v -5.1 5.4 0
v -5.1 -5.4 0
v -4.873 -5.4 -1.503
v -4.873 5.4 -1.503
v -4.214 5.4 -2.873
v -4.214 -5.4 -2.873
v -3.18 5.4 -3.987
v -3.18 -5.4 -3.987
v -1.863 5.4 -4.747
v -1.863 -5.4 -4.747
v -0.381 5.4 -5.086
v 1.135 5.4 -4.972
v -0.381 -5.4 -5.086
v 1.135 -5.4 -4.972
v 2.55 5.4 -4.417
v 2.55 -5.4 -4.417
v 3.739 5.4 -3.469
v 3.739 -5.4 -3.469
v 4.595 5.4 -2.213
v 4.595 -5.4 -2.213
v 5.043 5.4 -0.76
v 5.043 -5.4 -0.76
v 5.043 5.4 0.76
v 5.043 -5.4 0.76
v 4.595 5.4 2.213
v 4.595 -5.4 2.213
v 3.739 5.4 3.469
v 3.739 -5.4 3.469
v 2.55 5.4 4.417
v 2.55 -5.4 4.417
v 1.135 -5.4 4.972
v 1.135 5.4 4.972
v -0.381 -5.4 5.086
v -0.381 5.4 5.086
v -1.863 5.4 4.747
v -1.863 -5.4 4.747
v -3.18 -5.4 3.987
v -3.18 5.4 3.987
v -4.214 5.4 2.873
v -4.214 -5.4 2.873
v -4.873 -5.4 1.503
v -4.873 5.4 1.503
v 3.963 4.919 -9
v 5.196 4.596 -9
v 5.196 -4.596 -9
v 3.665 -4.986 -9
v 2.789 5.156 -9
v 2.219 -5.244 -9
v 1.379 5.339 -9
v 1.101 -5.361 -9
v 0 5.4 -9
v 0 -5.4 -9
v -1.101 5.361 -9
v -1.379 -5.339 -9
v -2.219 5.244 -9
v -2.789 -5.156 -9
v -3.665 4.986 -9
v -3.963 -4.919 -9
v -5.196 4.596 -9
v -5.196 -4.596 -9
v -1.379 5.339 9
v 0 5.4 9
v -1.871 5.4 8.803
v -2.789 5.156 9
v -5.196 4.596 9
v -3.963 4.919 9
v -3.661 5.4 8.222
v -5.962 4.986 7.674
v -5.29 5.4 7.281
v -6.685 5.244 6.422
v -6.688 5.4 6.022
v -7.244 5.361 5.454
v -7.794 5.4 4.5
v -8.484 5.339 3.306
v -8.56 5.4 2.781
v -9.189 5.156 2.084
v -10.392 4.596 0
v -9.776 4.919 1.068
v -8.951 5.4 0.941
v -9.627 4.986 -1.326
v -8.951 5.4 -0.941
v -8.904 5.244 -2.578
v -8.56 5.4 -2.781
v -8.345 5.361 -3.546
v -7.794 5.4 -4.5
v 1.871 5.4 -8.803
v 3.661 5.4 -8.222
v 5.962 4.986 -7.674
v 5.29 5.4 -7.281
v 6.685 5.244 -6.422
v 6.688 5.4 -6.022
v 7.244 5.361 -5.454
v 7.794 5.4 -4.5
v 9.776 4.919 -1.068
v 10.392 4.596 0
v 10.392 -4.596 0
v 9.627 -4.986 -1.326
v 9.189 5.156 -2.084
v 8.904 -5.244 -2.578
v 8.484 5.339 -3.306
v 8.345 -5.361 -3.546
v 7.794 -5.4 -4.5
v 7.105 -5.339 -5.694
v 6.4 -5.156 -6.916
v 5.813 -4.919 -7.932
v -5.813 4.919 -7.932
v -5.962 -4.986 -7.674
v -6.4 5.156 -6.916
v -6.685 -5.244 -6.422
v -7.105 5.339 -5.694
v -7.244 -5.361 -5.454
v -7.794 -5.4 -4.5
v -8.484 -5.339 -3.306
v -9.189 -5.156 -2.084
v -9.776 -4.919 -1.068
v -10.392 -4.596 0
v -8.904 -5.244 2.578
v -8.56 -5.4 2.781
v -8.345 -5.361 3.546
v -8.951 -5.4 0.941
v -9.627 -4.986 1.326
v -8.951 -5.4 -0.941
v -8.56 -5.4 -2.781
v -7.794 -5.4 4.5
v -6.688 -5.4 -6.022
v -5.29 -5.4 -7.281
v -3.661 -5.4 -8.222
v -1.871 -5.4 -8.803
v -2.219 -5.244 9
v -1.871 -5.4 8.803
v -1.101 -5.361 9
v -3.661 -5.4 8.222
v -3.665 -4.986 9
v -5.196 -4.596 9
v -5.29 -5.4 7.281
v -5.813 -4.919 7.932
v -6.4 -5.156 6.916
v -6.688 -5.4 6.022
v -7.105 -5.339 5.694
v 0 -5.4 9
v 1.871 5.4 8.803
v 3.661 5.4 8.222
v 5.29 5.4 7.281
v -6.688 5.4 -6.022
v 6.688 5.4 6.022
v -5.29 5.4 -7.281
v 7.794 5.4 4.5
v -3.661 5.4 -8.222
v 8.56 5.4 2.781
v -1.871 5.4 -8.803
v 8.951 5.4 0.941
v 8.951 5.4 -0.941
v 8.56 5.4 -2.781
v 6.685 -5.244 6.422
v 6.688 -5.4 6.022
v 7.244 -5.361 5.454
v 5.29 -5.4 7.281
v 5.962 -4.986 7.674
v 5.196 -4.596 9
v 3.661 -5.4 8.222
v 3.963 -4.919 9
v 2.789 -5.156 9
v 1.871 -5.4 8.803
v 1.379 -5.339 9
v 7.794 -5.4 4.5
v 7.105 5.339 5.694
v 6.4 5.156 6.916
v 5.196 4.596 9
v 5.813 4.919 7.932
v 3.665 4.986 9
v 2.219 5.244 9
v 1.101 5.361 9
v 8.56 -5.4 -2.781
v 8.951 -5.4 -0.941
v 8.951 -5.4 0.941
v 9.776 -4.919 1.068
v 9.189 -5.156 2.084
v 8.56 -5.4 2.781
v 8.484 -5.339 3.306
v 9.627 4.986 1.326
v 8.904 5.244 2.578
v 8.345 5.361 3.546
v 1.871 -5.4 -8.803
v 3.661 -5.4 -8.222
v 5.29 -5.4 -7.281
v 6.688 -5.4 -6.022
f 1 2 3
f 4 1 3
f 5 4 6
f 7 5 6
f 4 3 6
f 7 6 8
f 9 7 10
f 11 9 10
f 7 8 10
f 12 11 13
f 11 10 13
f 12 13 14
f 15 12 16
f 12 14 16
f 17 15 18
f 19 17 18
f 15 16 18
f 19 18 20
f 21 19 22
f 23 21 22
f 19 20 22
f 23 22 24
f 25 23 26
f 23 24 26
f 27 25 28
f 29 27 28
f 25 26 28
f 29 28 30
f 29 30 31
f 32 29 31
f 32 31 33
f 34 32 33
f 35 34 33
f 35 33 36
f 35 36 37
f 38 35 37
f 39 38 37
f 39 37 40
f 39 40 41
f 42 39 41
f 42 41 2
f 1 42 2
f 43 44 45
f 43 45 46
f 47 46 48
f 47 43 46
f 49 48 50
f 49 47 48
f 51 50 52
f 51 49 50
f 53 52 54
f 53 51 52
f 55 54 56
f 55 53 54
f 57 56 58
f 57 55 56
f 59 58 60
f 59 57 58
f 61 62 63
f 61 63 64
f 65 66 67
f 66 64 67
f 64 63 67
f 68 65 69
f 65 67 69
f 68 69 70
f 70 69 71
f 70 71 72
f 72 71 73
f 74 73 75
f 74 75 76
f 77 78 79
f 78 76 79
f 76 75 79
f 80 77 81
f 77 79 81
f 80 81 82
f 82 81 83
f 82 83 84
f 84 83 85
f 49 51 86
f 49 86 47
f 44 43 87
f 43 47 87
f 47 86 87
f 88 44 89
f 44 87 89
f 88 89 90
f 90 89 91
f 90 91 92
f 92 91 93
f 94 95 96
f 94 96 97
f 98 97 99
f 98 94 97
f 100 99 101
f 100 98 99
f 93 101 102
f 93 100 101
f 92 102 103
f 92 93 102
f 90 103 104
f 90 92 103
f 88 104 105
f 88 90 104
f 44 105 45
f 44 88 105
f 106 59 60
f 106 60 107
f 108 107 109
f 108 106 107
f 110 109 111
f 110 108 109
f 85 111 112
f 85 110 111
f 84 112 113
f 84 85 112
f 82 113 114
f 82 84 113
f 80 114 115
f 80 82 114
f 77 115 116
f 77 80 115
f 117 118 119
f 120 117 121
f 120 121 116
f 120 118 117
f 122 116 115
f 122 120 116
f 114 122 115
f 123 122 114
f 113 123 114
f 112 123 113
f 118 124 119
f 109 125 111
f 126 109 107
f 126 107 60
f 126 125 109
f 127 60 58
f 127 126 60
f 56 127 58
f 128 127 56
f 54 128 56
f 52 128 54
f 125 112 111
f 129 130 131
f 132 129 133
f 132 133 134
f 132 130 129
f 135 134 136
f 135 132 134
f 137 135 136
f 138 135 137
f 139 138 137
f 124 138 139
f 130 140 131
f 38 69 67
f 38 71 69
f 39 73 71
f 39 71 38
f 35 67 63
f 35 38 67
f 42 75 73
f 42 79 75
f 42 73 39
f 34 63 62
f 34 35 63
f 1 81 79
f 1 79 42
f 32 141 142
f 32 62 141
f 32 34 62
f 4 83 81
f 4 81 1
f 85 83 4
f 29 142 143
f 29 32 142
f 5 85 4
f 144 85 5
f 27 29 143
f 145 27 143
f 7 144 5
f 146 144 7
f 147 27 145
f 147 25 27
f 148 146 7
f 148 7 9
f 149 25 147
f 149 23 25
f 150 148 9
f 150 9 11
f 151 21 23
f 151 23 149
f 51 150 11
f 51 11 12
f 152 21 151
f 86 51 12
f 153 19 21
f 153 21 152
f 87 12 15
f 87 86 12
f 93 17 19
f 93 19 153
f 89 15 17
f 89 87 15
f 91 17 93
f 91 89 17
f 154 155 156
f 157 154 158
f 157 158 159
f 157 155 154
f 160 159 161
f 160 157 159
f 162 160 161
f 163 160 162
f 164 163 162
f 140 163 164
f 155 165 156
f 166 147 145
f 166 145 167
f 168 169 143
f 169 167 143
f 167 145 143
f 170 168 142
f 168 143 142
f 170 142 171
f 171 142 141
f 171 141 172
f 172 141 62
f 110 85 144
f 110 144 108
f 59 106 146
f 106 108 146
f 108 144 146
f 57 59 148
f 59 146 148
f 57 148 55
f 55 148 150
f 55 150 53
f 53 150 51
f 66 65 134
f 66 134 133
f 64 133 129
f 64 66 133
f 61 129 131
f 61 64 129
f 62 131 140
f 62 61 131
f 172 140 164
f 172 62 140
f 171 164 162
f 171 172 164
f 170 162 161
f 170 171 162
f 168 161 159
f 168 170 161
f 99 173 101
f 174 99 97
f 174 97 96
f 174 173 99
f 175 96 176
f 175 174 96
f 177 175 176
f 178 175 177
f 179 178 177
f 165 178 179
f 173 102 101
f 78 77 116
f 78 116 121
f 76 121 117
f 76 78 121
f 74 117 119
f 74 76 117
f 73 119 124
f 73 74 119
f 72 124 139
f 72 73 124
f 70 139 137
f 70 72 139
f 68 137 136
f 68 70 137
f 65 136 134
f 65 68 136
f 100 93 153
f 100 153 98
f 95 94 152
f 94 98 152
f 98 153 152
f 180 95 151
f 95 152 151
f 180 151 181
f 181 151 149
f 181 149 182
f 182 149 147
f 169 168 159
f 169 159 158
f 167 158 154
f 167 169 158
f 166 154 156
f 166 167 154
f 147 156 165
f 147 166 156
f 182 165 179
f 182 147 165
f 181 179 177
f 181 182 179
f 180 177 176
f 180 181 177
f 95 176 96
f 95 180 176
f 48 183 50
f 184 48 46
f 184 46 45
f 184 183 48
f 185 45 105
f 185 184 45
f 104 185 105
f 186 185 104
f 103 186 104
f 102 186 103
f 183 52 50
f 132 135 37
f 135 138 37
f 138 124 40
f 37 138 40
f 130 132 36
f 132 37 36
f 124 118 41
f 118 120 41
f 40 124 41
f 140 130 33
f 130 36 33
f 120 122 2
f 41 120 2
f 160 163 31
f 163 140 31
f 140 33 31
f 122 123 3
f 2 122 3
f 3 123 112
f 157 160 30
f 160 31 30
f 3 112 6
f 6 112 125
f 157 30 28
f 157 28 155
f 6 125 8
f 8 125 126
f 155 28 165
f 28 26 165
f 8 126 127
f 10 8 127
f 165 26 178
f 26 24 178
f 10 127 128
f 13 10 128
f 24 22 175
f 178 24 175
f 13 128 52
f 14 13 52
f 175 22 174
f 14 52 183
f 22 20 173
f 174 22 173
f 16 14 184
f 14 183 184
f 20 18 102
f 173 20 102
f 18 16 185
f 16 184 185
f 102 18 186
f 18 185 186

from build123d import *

# Parameters (mm, degrees)
BOSS_EXTRUDE1_DEPTH     = 5.4
M12X1_75_TAPPED_HOLE1_D = 10.2


with BuildPart() as part:
    # Sketch1 → Boss-Extrude1 (new, symmetric)
    with BuildSketch(Plane(origin=(0, 0, 0), x_dir=(1, 0, 0), z_dir=(0, 1, 0))):
        Polygon((10.392304845, 0), (5.196152423, 9), (-5.196152423, 9), (-10.392304845, 0), (-5.196152423, -9), (5.196152423, -9), align=None)
    extrude(amount=BOSS_EXTRUDE1_DEPTH, both=True)

    # Sketch2 → Cut-Revolve1 (revolve, cut)
    with BuildSketch(Plane(origin=(0, 0, 0), x_dir=(0, 0, -1), z_dir=(1, 0, 0))):
        Polygon((9, 5.4), (13.81357482, 5.4), (13.81357482, 2.620881282), align=None)
    cut_revolve1 = revolve(axis=Axis((0, 0, 0), (0, -1, 0)), mode=Mode.SUBTRACT)

    # Mirror1: Cut-Revolve1 across plane
    add(cut_revolve1.mirror(Plane.ZX), mode=Mode.SUBTRACT)

    # M12x1.75 Tapped Hole1 (through all)
    with Locations(Plane(origin=(0, 5.4, 0), x_dir=(1, 0, 0), z_dir=(0, 1, 0))):
        with Locations((0, 0)):
            Hole(M12X1_75_TAPPED_HOLE1_D / 2)


solid = part.part
